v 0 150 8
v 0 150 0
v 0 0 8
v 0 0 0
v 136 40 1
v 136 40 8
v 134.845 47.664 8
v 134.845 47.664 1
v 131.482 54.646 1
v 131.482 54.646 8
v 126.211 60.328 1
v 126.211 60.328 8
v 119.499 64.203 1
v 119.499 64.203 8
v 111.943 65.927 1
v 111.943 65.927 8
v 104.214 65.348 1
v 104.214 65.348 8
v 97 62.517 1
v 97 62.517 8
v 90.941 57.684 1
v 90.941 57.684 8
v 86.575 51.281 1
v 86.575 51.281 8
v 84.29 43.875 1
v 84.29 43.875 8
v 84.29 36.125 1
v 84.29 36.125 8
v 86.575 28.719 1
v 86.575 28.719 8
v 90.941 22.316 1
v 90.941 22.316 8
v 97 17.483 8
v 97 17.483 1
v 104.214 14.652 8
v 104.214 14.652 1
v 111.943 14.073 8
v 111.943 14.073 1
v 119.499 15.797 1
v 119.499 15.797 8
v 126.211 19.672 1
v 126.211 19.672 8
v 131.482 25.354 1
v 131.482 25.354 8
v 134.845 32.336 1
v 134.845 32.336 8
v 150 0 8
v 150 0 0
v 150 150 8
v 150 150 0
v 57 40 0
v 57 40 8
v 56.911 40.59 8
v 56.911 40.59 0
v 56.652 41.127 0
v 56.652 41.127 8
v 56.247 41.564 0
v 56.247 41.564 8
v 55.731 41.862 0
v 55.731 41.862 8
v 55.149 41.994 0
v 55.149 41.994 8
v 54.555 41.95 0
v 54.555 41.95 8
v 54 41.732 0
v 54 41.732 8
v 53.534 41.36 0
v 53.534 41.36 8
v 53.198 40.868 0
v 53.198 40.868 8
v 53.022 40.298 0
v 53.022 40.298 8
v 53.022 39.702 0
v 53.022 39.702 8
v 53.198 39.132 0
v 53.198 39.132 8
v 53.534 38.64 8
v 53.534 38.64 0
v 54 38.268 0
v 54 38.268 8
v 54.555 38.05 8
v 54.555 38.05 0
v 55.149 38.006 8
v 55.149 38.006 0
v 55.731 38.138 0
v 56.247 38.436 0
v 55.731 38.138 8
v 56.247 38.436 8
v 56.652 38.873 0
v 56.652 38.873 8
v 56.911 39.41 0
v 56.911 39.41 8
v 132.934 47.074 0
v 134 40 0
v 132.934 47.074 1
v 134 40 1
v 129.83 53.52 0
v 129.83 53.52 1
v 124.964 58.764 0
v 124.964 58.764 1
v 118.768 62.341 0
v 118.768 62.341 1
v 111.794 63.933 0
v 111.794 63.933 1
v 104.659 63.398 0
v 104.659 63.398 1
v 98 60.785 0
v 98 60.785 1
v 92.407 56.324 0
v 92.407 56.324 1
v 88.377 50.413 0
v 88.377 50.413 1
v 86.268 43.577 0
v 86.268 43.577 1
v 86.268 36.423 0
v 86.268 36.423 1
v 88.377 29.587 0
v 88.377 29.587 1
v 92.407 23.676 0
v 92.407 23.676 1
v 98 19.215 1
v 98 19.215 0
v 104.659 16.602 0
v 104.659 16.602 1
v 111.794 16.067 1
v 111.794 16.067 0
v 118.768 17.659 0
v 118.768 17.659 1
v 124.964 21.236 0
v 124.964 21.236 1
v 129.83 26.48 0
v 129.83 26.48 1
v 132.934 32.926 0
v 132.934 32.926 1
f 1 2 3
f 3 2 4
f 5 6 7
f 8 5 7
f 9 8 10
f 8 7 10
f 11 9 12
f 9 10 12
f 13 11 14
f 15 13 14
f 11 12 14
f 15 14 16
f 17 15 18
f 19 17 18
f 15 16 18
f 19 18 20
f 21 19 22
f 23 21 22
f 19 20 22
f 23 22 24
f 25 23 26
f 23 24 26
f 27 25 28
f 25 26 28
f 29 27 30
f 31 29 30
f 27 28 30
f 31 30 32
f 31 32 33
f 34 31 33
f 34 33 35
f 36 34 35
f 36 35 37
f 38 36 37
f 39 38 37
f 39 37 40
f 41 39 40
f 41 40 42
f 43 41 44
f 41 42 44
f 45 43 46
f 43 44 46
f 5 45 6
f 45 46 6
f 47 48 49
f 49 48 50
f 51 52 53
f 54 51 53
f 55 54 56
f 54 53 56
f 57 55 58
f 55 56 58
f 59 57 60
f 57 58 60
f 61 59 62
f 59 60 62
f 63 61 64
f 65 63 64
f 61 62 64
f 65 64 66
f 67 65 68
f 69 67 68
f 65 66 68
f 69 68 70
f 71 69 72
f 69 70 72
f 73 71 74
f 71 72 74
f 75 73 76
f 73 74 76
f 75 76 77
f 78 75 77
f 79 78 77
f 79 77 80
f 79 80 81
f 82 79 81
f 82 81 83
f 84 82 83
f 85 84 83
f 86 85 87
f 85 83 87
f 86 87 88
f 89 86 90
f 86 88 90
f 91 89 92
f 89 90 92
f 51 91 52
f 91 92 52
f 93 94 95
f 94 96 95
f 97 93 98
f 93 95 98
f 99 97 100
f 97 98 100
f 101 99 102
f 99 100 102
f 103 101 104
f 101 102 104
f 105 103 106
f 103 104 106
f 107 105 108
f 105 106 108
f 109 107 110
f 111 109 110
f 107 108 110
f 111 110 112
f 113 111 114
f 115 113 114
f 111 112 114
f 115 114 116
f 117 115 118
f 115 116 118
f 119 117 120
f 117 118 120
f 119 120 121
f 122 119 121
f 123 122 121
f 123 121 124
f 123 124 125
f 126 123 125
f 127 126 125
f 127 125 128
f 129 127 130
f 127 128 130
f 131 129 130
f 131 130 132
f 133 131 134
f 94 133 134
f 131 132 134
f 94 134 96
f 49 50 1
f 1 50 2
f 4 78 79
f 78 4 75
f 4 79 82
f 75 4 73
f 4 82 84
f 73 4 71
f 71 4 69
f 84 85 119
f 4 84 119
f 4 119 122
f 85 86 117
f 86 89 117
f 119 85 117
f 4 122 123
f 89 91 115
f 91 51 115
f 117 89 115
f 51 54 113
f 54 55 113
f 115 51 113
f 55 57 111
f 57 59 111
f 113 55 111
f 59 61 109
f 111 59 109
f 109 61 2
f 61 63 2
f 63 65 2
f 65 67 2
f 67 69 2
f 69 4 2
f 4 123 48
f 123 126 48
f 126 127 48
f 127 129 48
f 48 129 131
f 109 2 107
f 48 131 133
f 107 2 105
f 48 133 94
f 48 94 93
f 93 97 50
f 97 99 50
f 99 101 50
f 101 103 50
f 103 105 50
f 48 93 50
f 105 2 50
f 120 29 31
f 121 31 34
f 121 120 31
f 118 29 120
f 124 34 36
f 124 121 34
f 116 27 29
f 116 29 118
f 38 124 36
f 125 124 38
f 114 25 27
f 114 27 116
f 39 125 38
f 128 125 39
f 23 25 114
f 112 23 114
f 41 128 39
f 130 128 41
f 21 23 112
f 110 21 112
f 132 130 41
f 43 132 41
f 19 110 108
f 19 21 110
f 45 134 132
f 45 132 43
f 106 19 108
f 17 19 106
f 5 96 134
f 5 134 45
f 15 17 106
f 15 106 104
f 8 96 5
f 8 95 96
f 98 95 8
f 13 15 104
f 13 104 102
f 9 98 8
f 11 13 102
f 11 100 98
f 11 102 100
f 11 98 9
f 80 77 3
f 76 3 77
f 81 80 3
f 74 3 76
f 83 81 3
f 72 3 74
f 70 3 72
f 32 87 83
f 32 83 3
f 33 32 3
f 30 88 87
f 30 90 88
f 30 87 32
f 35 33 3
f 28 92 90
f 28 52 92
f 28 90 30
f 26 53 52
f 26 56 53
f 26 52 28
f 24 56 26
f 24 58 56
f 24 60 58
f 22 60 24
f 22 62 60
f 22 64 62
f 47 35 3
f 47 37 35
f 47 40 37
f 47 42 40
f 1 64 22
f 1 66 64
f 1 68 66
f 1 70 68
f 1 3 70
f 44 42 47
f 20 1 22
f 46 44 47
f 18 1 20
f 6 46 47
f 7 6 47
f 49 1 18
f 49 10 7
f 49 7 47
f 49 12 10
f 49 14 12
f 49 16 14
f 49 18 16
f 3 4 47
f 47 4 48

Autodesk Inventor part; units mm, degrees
ref_plane "YZ Plane" through (0, 0, 0) normal (1, 0, 0) x (0, 1, 0)
ref_plane "XZ Plane" through (0, 0, 0) normal (0, 1, 0) x (-1, 0, 0)
ref_plane "XY Plane" through (0, 0, 0) normal (0, 0, 1) x (1, 0, 0)
sketch "Sketch1" plane through (0, 0, 0) normal (0, 0, 1) x (1, 0, 0)
  line L0 (0, 0) -> (150, 0)
  line L1 (150, 0) -> (150, 150)
  line L2 (150, 150) -> (0, 150)
  line L3 (0, 150) -> (0, 0)
  dimension "d0" = 150
  dimension "d1" = 150
extrude "Extrusion1" add sketch "Sketch1" along normal blind 8
sketch "Sketch2" plane through (0, 0, 8) normal (0, 0, 1) x (1, 0, 0)
  circle A0 centre (110, 40) radius 24
  line L0 (0, 0) -> (150, 0) projected
  line L1 (150, 0) -> (150, 150) projected
  line L2 (110, 40) -> (55, 40)
  circle A1 centre (55, 40) radius 2
  dimension "d4" = 48
  dimension "d5" = 40
  dimension "d6" = 40
  dimension "d7" = 55
  dimension "d8" = 4
extrude "Extrusion2" cut sketch "Sketch2" against normal blind 8
sketch "Sketch3" plane through (0, 0, 8) normal (0, 0, 1) x (1, 0, 0)
  circle A0 centre (110, 40) radius 26
  point P0 (0, 0)
  dimension "d12" = 52
extrude "Extrusion3" cut sketch "Sketch3" against normal blind 7
properties part number "cote droit"
